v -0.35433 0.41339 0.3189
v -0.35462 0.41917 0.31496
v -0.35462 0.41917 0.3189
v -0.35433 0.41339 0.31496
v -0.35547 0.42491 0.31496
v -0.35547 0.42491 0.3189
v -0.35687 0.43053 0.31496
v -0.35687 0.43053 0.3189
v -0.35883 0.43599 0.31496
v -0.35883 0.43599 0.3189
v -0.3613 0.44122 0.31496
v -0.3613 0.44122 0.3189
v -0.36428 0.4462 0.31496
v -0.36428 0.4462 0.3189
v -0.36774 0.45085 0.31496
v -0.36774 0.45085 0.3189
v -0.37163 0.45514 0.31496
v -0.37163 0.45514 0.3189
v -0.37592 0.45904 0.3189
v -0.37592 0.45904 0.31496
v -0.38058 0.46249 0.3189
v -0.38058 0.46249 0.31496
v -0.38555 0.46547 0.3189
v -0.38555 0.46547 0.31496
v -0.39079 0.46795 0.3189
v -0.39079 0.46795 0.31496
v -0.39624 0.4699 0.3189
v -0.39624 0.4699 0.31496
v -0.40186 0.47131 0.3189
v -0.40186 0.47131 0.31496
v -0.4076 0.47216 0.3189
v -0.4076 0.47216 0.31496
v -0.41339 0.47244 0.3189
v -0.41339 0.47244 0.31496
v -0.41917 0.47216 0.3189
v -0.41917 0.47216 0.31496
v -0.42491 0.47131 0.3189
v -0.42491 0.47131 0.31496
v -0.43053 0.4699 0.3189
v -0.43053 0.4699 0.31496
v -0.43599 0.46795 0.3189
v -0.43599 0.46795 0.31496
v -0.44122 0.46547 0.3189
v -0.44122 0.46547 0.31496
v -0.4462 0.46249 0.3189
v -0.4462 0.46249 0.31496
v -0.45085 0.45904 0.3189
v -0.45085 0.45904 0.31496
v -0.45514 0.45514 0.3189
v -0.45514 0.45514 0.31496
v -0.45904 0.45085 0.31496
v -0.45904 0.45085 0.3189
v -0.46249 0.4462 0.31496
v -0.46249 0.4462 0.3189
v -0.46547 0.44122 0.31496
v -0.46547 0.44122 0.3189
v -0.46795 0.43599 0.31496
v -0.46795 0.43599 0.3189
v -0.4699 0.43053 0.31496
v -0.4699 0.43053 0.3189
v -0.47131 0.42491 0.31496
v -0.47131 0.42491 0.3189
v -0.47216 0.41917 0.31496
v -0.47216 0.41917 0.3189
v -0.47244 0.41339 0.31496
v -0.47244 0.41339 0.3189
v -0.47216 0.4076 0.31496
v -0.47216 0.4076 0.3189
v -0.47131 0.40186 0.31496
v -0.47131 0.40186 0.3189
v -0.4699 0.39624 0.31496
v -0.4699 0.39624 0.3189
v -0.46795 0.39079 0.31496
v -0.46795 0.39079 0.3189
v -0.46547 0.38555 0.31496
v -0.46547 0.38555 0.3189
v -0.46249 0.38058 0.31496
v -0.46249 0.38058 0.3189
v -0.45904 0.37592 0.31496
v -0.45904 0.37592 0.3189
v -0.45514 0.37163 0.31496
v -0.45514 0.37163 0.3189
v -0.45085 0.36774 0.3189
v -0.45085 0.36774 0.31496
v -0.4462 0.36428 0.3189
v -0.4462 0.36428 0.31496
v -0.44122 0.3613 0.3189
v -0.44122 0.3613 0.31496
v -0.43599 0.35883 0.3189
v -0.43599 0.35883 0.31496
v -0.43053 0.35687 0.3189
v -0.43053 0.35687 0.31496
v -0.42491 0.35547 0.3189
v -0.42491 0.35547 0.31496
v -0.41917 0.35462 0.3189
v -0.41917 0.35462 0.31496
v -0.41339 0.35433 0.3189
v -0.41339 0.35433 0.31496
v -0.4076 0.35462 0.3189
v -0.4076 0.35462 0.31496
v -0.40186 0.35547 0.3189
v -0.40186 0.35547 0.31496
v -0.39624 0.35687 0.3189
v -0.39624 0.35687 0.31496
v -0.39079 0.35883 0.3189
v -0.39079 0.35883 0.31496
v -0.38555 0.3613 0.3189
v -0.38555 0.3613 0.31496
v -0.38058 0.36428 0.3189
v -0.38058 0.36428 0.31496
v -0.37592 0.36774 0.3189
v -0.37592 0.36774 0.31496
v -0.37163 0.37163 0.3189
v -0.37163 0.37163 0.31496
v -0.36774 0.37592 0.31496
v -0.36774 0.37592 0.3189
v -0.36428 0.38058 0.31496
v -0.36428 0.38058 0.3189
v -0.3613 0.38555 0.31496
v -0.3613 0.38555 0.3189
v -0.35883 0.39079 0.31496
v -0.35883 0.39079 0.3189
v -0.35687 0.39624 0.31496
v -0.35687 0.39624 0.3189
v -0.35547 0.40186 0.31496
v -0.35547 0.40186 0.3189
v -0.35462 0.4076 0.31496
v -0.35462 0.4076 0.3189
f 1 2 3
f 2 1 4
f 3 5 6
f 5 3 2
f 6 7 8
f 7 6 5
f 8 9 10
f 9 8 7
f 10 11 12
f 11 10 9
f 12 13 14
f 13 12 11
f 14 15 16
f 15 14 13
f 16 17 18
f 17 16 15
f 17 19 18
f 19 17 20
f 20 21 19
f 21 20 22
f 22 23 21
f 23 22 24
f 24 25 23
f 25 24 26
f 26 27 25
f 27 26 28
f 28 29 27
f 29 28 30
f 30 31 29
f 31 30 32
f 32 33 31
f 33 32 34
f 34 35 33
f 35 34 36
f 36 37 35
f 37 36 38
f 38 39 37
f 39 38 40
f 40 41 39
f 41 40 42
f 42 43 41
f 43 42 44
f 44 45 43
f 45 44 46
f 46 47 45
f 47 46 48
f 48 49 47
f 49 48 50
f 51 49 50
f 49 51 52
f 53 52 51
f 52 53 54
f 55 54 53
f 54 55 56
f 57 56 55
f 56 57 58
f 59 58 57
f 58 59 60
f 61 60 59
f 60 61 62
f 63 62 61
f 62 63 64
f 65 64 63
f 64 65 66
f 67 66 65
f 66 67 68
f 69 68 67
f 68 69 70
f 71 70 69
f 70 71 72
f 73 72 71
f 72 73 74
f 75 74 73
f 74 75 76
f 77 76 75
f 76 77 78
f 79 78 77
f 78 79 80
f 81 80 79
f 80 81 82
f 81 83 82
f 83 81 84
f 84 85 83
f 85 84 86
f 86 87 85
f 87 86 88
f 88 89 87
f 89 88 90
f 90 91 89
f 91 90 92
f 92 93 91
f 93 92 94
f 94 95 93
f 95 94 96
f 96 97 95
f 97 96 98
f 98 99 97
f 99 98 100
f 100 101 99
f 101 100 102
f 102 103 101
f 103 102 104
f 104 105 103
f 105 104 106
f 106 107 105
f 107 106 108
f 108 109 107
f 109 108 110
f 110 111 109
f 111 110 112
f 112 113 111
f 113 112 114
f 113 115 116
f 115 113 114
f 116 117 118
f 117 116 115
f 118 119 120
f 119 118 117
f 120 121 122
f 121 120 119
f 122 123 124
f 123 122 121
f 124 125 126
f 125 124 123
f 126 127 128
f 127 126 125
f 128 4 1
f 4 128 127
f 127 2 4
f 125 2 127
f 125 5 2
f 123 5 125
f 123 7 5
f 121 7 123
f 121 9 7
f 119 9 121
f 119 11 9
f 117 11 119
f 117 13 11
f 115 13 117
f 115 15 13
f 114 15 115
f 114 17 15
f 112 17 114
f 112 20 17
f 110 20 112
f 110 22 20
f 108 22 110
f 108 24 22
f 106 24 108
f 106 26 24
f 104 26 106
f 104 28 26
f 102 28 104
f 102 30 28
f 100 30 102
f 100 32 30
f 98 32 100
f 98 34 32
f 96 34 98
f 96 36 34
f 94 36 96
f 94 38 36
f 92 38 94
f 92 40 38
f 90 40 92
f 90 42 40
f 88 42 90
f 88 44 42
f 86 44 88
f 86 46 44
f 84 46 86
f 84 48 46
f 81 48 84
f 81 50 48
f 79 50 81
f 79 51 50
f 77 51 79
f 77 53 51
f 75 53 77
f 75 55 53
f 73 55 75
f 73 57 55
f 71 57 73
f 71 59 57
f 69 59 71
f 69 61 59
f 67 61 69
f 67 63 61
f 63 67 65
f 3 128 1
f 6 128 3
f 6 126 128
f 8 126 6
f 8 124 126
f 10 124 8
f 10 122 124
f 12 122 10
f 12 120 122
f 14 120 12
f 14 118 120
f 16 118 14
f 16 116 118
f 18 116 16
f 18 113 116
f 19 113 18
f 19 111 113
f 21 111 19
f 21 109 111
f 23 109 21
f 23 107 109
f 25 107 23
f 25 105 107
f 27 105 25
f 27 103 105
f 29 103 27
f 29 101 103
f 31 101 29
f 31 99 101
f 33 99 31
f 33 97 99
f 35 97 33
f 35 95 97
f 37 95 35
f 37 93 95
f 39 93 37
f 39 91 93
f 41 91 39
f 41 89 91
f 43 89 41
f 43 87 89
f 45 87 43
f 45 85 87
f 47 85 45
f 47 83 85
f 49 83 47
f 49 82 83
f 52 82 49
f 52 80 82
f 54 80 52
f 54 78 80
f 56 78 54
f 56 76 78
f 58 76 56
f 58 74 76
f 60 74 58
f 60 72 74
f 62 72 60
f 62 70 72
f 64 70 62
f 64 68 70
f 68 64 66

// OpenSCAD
// file: defines.scad
L = 3.1;  // Длина
W = 3.1;  // Ширина
H = 0.8;  // Высота (от платы, с выводами)
Hf = 0.04;  // Возвышение над платой (высота выводов)
e = 0.5;    // Шаг выводов

pin_fragments = 16;

scale = 1/2.54;
// main file
include <defines.scad>

font = "Liberation Sans";
/*font = "DejaVu";*/
/*font = "Abyssinica SIL";*/

f_x = -0.8;
f_y = 1.5;
f_dy = -0.4;
fscale = 0.03;
lab_h = 0.01;

// Label
scale(scale) color("White") {

    /*translate([f_x, f_y+f_dy, H]) {
        scale([fscale,fscale,1])
        linear_extrude(height = lab_h, center=false) {
            text("Texas", font = font);
        }
    }
    translate([f_x, f_y+2*f_dy, H]) {
        scale([fscale,fscale,1])
        linear_extrude(height = lab_h, center=false) {
            text("Instruments", font = font);
        }
    }*/

    translate([-1.05, 1.05, H]) {
        cylinder(r = 0.15, h = lab_h, $fn = 64);
    }

}
